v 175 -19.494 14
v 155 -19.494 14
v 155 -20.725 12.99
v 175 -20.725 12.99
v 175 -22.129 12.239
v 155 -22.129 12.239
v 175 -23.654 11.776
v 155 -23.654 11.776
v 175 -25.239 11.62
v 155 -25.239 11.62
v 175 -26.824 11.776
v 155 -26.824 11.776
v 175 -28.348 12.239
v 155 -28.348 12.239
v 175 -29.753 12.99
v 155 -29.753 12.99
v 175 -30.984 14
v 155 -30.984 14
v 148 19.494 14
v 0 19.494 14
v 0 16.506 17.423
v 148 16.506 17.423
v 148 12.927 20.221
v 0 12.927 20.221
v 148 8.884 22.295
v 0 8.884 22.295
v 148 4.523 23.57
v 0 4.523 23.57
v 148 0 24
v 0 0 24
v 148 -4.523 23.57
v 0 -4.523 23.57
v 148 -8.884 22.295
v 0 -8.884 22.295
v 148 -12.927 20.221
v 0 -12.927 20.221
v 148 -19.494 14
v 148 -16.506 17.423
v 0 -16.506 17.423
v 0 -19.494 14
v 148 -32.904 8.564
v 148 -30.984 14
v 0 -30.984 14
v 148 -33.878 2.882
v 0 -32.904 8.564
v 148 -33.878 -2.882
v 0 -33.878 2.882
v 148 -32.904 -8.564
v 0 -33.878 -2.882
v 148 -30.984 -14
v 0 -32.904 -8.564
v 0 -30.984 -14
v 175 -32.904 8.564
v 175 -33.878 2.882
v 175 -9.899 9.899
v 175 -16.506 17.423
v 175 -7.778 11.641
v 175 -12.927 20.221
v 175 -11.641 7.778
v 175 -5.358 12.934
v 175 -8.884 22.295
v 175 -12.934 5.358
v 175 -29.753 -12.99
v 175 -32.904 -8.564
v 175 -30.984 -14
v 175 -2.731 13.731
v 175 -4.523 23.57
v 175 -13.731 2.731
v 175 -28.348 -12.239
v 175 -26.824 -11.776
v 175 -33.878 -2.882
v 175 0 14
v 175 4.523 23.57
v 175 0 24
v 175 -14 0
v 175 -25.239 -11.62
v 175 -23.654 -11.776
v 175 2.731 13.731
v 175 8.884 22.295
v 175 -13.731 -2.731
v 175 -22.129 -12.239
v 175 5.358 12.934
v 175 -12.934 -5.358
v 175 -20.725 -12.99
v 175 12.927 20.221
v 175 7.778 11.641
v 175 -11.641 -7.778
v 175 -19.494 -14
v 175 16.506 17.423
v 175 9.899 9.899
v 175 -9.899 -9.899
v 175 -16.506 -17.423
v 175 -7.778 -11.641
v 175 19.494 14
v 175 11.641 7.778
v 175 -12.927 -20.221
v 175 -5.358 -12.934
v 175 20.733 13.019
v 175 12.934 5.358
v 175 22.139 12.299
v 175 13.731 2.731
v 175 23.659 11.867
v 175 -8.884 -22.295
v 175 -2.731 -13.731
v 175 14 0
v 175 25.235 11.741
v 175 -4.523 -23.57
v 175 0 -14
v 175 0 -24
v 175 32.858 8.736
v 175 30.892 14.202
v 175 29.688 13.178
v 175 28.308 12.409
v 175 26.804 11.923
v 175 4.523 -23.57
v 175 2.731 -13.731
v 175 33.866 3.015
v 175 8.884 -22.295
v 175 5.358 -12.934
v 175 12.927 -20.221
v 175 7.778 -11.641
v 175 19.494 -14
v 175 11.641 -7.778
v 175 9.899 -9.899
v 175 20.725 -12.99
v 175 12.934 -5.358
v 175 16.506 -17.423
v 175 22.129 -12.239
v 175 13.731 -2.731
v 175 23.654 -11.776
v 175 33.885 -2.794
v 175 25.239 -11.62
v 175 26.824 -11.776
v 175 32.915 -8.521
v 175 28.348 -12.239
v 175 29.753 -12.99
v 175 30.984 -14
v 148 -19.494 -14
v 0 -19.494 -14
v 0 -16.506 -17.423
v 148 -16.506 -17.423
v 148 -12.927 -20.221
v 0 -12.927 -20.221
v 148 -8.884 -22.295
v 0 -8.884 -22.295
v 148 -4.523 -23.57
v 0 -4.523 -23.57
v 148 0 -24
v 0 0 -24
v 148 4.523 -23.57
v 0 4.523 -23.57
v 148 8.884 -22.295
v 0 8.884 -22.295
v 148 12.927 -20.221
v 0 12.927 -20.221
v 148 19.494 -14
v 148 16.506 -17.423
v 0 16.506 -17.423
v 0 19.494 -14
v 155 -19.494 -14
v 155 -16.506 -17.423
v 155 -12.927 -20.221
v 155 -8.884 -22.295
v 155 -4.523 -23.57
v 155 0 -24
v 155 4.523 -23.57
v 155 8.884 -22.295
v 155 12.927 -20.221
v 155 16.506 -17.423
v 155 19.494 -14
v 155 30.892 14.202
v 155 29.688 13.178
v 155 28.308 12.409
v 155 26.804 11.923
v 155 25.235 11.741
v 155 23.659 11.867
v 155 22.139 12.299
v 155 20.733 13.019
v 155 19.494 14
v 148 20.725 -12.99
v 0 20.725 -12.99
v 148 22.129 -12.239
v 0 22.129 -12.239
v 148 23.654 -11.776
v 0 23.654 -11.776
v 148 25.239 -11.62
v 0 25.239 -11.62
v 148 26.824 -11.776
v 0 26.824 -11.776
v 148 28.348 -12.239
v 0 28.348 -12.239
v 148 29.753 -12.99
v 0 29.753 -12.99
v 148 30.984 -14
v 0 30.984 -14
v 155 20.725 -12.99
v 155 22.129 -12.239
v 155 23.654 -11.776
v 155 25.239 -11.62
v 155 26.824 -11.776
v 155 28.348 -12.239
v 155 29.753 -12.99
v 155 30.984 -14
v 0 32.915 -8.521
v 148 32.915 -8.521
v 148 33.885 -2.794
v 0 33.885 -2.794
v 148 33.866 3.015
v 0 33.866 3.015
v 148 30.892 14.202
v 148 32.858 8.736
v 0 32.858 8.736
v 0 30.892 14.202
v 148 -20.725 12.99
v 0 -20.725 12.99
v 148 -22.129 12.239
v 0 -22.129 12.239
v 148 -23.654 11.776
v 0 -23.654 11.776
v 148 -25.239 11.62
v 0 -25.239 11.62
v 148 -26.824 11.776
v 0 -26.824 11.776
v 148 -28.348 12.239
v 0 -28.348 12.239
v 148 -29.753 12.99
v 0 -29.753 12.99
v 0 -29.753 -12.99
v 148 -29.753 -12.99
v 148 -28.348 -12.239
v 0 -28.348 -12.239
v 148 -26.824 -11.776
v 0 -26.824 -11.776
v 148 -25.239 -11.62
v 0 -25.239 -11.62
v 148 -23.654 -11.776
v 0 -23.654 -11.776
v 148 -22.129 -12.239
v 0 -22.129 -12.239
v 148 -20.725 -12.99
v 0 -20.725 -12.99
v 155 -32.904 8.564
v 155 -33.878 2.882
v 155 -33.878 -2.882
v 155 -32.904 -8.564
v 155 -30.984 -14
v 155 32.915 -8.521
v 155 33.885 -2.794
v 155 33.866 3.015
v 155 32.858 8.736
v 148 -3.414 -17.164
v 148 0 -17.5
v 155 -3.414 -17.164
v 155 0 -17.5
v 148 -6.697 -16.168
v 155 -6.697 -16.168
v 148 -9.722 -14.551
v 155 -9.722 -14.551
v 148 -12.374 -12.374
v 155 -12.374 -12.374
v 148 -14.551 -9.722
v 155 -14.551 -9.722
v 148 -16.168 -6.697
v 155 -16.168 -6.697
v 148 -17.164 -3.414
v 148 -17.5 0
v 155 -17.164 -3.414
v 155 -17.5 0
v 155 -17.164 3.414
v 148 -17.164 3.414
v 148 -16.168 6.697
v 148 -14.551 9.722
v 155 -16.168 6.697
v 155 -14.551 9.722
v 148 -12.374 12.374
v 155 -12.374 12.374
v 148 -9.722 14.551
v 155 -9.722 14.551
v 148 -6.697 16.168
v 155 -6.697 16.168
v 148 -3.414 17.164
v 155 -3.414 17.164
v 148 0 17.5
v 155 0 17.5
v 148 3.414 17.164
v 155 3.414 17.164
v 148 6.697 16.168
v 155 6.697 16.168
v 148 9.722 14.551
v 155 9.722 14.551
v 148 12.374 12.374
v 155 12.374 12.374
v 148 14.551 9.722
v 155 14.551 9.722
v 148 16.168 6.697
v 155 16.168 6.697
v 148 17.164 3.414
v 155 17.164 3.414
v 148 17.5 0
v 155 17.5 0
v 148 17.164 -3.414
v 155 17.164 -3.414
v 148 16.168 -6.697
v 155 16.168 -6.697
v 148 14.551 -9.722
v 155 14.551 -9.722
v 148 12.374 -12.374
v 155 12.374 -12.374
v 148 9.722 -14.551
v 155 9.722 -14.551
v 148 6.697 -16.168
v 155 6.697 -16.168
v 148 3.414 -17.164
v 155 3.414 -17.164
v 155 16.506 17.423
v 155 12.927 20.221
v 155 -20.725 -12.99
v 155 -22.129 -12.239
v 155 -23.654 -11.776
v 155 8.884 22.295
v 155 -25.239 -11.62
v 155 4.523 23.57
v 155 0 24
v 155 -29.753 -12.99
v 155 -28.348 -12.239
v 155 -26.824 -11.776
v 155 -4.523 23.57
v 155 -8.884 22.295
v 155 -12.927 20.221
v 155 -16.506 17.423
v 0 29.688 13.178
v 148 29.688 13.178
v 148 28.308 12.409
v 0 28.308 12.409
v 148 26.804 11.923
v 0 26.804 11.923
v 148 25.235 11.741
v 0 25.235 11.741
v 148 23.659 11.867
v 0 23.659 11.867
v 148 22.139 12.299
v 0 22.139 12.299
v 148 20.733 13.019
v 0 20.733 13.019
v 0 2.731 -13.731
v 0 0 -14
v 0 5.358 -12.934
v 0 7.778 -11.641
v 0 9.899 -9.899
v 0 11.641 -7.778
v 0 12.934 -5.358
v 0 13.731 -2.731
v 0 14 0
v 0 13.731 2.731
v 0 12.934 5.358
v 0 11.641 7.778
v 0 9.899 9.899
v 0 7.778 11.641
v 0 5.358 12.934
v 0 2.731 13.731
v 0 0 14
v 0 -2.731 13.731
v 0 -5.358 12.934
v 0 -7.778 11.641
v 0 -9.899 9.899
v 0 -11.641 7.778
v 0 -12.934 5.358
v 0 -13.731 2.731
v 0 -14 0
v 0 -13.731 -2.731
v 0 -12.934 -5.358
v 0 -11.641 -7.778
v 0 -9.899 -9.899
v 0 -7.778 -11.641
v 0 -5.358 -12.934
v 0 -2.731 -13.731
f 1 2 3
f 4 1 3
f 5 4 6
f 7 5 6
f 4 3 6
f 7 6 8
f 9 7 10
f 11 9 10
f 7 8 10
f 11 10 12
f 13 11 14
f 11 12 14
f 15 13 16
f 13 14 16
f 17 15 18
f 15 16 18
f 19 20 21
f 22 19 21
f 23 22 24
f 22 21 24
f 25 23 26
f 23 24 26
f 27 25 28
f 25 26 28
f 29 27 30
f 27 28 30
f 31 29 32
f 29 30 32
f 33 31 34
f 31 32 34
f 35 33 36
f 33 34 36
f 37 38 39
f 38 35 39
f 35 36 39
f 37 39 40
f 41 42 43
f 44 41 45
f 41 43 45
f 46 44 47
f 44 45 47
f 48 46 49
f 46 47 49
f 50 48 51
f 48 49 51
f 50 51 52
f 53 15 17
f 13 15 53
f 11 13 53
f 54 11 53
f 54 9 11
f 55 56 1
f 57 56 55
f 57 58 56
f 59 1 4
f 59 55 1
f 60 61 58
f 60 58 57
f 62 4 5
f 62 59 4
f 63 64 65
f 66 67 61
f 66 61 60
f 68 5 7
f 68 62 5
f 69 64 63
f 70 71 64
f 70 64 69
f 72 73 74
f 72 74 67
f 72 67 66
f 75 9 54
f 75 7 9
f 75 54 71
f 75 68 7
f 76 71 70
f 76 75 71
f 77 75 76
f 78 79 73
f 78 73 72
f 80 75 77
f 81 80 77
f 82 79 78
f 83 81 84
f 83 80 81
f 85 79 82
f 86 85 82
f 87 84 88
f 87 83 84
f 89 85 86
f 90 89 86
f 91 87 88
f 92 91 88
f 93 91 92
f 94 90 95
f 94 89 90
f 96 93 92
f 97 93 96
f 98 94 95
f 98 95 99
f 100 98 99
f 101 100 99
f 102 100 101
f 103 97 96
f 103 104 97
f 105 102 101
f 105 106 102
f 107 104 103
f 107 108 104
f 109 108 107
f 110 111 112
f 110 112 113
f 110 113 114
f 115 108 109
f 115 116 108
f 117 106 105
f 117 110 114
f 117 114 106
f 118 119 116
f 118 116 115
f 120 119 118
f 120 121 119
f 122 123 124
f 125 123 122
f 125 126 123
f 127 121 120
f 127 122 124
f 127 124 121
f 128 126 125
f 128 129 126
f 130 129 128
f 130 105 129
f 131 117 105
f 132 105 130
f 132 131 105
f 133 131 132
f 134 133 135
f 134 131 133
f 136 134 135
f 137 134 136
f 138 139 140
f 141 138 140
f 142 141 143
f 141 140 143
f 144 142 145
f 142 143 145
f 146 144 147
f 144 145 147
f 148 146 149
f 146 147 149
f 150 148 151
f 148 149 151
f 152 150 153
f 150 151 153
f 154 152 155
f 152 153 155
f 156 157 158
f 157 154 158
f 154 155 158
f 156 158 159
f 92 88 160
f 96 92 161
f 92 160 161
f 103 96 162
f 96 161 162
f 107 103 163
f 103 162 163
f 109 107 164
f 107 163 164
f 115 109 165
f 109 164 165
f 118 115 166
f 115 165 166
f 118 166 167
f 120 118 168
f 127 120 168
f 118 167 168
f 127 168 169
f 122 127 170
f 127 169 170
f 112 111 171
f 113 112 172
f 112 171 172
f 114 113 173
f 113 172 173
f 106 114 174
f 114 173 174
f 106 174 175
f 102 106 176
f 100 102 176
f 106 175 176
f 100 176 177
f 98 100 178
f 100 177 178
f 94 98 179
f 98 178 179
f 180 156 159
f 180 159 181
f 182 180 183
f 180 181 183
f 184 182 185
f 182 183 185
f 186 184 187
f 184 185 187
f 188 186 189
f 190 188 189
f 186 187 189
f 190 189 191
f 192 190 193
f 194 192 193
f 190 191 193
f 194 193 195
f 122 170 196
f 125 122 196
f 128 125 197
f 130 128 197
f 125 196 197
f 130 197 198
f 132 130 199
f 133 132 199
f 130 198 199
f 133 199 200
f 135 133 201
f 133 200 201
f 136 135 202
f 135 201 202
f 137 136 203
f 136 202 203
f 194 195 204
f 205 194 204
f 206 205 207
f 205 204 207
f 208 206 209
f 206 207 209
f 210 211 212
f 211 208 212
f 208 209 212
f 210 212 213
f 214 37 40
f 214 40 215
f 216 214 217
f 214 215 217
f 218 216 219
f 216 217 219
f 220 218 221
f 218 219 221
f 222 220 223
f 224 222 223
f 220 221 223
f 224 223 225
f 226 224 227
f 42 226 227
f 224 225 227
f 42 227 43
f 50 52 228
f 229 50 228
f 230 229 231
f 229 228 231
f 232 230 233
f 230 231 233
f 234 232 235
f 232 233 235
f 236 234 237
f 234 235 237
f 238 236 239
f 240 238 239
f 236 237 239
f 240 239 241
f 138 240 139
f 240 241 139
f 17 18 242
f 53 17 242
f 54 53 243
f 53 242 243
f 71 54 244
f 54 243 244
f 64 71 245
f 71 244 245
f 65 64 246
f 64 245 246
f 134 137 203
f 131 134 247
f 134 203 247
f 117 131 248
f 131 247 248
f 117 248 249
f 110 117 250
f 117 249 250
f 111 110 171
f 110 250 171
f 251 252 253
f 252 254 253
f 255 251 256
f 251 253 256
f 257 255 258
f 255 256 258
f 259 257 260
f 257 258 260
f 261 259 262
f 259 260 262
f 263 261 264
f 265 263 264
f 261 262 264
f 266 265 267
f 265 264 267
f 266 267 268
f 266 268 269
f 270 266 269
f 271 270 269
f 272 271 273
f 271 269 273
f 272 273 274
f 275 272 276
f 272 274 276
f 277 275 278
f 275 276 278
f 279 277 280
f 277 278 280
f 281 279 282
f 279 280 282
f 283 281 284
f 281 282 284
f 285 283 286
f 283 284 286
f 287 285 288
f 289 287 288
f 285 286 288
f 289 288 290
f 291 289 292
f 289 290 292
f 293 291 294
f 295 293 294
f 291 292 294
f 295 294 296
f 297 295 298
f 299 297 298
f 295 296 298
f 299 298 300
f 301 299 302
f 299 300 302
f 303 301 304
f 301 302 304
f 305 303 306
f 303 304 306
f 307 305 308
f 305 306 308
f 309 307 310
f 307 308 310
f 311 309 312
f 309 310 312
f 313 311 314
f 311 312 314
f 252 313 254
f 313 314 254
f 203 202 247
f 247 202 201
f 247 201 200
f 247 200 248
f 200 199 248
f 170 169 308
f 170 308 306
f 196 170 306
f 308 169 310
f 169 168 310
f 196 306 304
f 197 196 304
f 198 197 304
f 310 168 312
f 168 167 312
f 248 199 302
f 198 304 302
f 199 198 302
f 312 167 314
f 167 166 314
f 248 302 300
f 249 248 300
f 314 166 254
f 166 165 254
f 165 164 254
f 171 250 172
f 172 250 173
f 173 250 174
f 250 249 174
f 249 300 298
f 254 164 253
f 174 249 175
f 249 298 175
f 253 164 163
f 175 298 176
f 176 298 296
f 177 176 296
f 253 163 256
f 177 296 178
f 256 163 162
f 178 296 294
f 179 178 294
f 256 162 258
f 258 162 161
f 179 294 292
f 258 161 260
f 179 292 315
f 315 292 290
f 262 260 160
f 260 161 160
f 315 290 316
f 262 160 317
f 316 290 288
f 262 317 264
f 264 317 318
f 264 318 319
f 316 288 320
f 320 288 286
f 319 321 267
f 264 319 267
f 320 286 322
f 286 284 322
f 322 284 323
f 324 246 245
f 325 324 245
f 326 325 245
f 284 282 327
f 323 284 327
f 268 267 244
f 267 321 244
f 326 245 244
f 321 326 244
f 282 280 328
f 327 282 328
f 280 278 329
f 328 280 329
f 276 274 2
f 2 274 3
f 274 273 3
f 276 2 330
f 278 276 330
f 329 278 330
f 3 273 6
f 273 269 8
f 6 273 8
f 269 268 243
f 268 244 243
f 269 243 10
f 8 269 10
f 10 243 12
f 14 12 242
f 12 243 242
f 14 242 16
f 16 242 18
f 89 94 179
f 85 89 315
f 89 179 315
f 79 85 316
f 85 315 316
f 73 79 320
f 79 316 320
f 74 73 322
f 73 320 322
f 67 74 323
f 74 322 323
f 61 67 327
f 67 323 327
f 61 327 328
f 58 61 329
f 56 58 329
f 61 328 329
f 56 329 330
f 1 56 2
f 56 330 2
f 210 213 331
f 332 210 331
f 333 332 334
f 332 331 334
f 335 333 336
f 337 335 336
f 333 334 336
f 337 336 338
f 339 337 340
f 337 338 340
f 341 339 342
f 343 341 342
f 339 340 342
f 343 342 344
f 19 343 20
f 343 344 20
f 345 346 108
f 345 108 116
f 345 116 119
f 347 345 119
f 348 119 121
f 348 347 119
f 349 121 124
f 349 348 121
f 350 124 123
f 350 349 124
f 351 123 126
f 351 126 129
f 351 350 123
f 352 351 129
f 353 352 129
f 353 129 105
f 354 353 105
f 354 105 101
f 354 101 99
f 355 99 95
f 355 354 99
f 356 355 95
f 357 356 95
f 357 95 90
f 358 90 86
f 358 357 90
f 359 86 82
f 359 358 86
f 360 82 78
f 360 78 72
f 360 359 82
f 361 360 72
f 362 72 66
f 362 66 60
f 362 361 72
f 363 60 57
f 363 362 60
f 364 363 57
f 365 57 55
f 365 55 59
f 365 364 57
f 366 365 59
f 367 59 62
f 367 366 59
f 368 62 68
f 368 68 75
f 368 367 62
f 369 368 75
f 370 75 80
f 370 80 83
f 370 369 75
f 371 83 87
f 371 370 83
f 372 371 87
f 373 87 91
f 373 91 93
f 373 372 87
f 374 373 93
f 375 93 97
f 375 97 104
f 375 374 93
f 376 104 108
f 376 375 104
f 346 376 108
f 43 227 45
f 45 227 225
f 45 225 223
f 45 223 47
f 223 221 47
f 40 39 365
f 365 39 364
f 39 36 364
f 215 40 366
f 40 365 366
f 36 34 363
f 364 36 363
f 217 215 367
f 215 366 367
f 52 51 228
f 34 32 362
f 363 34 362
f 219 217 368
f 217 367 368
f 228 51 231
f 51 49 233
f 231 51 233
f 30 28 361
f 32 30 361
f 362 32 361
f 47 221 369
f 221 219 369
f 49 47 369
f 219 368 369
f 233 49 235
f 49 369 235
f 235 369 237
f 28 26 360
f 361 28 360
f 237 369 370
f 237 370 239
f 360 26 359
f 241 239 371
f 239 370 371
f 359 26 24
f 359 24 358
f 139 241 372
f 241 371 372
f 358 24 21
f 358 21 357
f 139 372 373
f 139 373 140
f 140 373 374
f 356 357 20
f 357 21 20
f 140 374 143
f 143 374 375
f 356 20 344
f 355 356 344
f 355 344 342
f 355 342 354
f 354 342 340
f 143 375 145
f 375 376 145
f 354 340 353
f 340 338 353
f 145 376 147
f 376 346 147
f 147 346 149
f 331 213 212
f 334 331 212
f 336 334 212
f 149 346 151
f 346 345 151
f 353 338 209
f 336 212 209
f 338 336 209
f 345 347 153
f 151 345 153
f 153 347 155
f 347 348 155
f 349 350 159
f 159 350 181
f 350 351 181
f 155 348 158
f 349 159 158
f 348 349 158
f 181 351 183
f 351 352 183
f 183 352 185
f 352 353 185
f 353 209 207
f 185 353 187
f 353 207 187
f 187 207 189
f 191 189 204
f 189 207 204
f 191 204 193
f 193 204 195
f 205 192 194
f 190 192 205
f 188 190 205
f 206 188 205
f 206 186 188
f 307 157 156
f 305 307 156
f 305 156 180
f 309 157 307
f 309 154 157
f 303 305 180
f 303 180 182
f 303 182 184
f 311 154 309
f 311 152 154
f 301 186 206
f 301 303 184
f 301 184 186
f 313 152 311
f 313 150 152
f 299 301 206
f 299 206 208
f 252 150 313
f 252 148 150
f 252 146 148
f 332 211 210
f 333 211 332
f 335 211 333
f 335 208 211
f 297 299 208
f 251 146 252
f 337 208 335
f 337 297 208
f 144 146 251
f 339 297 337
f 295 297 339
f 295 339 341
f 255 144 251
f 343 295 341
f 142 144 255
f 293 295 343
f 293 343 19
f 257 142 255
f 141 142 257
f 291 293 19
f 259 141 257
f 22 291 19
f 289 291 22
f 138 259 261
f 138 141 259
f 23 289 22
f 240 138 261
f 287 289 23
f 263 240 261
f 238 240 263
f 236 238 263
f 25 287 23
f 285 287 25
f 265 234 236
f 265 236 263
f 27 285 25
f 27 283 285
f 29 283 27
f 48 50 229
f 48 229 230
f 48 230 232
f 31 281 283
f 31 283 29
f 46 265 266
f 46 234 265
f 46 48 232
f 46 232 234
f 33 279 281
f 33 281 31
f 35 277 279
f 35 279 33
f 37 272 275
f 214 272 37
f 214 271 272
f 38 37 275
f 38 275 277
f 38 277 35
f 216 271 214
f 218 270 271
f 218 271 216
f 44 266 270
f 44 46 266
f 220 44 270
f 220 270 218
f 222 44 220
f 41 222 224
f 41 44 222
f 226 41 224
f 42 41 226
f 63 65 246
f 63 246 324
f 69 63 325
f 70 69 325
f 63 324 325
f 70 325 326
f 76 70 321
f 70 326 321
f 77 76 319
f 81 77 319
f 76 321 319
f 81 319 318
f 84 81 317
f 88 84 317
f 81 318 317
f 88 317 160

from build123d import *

# Parameters (mm, degrees)
SKETCH1_R           = 14
BOSS_EXTRUDE1_DEPTH = 175
SKETCH5_W           = 7
SKETCH5_H           = 23.880326309


with BuildPart() as part:
    # Sketch1 → Boss-Extrude1 (new body)
    with BuildSketch(Plane(origin=(0, 0, 0), x_dir=(0, 0, -1), z_dir=(1, 0, 0))):
        with BuildLine():
            ThreePointArc((-14, 19.49358869), (-24, 0), (-14, -19.49358869))
            ThreePointArc((-14, -19.49358869), (-11.620285492, -25.23872773), (-14, -30.98386677))
            ThreePointArc((-14, -30.98386677), (0, -34), (14, -30.98386677))
            ThreePointArc((14, -30.98386677), (11.620285492, -25.23872773), (14, -19.49358869))
            ThreePointArc((14, -19.49358869), (24, 0), (14, 19.49358869))
            ThreePointArc((14, 19.49358869), (11.620285492, 25.23872773), (14, 30.98386677))
            ThreePointArc((14, 30.98386677), (-0.111150927, 33.999818315), (-14.202281174, 30.891668933))
            ThreePointArc((-14.202281174, 30.891668933), (-11.740520876, 25.234522614), (-14, 19.49358869))
        make_face()
        Circle(SKETCH1_R, mode=Mode.SUBTRACT)
    extrude(amount=BOSS_EXTRUDE1_DEPTH)

    # Sketch5 → Cut-Revolve1 (revolve, cut)
    with BuildSketch(Plane.XY, mode=Mode.PRIVATE) as cut_revolve1_sk:
        with Locations((151.5, 29.440163155)):
            Rectangle(SKETCH5_W, SKETCH5_H)
    revolve(cut_revolve1_sk.sketch.rotate(Axis((175, 0, 0), (-1, 0, 0)), 90), axis=Axis((175, 0, 0), (-1, 0, 0)), mode=Mode.SUBTRACT)


solid = part.part
